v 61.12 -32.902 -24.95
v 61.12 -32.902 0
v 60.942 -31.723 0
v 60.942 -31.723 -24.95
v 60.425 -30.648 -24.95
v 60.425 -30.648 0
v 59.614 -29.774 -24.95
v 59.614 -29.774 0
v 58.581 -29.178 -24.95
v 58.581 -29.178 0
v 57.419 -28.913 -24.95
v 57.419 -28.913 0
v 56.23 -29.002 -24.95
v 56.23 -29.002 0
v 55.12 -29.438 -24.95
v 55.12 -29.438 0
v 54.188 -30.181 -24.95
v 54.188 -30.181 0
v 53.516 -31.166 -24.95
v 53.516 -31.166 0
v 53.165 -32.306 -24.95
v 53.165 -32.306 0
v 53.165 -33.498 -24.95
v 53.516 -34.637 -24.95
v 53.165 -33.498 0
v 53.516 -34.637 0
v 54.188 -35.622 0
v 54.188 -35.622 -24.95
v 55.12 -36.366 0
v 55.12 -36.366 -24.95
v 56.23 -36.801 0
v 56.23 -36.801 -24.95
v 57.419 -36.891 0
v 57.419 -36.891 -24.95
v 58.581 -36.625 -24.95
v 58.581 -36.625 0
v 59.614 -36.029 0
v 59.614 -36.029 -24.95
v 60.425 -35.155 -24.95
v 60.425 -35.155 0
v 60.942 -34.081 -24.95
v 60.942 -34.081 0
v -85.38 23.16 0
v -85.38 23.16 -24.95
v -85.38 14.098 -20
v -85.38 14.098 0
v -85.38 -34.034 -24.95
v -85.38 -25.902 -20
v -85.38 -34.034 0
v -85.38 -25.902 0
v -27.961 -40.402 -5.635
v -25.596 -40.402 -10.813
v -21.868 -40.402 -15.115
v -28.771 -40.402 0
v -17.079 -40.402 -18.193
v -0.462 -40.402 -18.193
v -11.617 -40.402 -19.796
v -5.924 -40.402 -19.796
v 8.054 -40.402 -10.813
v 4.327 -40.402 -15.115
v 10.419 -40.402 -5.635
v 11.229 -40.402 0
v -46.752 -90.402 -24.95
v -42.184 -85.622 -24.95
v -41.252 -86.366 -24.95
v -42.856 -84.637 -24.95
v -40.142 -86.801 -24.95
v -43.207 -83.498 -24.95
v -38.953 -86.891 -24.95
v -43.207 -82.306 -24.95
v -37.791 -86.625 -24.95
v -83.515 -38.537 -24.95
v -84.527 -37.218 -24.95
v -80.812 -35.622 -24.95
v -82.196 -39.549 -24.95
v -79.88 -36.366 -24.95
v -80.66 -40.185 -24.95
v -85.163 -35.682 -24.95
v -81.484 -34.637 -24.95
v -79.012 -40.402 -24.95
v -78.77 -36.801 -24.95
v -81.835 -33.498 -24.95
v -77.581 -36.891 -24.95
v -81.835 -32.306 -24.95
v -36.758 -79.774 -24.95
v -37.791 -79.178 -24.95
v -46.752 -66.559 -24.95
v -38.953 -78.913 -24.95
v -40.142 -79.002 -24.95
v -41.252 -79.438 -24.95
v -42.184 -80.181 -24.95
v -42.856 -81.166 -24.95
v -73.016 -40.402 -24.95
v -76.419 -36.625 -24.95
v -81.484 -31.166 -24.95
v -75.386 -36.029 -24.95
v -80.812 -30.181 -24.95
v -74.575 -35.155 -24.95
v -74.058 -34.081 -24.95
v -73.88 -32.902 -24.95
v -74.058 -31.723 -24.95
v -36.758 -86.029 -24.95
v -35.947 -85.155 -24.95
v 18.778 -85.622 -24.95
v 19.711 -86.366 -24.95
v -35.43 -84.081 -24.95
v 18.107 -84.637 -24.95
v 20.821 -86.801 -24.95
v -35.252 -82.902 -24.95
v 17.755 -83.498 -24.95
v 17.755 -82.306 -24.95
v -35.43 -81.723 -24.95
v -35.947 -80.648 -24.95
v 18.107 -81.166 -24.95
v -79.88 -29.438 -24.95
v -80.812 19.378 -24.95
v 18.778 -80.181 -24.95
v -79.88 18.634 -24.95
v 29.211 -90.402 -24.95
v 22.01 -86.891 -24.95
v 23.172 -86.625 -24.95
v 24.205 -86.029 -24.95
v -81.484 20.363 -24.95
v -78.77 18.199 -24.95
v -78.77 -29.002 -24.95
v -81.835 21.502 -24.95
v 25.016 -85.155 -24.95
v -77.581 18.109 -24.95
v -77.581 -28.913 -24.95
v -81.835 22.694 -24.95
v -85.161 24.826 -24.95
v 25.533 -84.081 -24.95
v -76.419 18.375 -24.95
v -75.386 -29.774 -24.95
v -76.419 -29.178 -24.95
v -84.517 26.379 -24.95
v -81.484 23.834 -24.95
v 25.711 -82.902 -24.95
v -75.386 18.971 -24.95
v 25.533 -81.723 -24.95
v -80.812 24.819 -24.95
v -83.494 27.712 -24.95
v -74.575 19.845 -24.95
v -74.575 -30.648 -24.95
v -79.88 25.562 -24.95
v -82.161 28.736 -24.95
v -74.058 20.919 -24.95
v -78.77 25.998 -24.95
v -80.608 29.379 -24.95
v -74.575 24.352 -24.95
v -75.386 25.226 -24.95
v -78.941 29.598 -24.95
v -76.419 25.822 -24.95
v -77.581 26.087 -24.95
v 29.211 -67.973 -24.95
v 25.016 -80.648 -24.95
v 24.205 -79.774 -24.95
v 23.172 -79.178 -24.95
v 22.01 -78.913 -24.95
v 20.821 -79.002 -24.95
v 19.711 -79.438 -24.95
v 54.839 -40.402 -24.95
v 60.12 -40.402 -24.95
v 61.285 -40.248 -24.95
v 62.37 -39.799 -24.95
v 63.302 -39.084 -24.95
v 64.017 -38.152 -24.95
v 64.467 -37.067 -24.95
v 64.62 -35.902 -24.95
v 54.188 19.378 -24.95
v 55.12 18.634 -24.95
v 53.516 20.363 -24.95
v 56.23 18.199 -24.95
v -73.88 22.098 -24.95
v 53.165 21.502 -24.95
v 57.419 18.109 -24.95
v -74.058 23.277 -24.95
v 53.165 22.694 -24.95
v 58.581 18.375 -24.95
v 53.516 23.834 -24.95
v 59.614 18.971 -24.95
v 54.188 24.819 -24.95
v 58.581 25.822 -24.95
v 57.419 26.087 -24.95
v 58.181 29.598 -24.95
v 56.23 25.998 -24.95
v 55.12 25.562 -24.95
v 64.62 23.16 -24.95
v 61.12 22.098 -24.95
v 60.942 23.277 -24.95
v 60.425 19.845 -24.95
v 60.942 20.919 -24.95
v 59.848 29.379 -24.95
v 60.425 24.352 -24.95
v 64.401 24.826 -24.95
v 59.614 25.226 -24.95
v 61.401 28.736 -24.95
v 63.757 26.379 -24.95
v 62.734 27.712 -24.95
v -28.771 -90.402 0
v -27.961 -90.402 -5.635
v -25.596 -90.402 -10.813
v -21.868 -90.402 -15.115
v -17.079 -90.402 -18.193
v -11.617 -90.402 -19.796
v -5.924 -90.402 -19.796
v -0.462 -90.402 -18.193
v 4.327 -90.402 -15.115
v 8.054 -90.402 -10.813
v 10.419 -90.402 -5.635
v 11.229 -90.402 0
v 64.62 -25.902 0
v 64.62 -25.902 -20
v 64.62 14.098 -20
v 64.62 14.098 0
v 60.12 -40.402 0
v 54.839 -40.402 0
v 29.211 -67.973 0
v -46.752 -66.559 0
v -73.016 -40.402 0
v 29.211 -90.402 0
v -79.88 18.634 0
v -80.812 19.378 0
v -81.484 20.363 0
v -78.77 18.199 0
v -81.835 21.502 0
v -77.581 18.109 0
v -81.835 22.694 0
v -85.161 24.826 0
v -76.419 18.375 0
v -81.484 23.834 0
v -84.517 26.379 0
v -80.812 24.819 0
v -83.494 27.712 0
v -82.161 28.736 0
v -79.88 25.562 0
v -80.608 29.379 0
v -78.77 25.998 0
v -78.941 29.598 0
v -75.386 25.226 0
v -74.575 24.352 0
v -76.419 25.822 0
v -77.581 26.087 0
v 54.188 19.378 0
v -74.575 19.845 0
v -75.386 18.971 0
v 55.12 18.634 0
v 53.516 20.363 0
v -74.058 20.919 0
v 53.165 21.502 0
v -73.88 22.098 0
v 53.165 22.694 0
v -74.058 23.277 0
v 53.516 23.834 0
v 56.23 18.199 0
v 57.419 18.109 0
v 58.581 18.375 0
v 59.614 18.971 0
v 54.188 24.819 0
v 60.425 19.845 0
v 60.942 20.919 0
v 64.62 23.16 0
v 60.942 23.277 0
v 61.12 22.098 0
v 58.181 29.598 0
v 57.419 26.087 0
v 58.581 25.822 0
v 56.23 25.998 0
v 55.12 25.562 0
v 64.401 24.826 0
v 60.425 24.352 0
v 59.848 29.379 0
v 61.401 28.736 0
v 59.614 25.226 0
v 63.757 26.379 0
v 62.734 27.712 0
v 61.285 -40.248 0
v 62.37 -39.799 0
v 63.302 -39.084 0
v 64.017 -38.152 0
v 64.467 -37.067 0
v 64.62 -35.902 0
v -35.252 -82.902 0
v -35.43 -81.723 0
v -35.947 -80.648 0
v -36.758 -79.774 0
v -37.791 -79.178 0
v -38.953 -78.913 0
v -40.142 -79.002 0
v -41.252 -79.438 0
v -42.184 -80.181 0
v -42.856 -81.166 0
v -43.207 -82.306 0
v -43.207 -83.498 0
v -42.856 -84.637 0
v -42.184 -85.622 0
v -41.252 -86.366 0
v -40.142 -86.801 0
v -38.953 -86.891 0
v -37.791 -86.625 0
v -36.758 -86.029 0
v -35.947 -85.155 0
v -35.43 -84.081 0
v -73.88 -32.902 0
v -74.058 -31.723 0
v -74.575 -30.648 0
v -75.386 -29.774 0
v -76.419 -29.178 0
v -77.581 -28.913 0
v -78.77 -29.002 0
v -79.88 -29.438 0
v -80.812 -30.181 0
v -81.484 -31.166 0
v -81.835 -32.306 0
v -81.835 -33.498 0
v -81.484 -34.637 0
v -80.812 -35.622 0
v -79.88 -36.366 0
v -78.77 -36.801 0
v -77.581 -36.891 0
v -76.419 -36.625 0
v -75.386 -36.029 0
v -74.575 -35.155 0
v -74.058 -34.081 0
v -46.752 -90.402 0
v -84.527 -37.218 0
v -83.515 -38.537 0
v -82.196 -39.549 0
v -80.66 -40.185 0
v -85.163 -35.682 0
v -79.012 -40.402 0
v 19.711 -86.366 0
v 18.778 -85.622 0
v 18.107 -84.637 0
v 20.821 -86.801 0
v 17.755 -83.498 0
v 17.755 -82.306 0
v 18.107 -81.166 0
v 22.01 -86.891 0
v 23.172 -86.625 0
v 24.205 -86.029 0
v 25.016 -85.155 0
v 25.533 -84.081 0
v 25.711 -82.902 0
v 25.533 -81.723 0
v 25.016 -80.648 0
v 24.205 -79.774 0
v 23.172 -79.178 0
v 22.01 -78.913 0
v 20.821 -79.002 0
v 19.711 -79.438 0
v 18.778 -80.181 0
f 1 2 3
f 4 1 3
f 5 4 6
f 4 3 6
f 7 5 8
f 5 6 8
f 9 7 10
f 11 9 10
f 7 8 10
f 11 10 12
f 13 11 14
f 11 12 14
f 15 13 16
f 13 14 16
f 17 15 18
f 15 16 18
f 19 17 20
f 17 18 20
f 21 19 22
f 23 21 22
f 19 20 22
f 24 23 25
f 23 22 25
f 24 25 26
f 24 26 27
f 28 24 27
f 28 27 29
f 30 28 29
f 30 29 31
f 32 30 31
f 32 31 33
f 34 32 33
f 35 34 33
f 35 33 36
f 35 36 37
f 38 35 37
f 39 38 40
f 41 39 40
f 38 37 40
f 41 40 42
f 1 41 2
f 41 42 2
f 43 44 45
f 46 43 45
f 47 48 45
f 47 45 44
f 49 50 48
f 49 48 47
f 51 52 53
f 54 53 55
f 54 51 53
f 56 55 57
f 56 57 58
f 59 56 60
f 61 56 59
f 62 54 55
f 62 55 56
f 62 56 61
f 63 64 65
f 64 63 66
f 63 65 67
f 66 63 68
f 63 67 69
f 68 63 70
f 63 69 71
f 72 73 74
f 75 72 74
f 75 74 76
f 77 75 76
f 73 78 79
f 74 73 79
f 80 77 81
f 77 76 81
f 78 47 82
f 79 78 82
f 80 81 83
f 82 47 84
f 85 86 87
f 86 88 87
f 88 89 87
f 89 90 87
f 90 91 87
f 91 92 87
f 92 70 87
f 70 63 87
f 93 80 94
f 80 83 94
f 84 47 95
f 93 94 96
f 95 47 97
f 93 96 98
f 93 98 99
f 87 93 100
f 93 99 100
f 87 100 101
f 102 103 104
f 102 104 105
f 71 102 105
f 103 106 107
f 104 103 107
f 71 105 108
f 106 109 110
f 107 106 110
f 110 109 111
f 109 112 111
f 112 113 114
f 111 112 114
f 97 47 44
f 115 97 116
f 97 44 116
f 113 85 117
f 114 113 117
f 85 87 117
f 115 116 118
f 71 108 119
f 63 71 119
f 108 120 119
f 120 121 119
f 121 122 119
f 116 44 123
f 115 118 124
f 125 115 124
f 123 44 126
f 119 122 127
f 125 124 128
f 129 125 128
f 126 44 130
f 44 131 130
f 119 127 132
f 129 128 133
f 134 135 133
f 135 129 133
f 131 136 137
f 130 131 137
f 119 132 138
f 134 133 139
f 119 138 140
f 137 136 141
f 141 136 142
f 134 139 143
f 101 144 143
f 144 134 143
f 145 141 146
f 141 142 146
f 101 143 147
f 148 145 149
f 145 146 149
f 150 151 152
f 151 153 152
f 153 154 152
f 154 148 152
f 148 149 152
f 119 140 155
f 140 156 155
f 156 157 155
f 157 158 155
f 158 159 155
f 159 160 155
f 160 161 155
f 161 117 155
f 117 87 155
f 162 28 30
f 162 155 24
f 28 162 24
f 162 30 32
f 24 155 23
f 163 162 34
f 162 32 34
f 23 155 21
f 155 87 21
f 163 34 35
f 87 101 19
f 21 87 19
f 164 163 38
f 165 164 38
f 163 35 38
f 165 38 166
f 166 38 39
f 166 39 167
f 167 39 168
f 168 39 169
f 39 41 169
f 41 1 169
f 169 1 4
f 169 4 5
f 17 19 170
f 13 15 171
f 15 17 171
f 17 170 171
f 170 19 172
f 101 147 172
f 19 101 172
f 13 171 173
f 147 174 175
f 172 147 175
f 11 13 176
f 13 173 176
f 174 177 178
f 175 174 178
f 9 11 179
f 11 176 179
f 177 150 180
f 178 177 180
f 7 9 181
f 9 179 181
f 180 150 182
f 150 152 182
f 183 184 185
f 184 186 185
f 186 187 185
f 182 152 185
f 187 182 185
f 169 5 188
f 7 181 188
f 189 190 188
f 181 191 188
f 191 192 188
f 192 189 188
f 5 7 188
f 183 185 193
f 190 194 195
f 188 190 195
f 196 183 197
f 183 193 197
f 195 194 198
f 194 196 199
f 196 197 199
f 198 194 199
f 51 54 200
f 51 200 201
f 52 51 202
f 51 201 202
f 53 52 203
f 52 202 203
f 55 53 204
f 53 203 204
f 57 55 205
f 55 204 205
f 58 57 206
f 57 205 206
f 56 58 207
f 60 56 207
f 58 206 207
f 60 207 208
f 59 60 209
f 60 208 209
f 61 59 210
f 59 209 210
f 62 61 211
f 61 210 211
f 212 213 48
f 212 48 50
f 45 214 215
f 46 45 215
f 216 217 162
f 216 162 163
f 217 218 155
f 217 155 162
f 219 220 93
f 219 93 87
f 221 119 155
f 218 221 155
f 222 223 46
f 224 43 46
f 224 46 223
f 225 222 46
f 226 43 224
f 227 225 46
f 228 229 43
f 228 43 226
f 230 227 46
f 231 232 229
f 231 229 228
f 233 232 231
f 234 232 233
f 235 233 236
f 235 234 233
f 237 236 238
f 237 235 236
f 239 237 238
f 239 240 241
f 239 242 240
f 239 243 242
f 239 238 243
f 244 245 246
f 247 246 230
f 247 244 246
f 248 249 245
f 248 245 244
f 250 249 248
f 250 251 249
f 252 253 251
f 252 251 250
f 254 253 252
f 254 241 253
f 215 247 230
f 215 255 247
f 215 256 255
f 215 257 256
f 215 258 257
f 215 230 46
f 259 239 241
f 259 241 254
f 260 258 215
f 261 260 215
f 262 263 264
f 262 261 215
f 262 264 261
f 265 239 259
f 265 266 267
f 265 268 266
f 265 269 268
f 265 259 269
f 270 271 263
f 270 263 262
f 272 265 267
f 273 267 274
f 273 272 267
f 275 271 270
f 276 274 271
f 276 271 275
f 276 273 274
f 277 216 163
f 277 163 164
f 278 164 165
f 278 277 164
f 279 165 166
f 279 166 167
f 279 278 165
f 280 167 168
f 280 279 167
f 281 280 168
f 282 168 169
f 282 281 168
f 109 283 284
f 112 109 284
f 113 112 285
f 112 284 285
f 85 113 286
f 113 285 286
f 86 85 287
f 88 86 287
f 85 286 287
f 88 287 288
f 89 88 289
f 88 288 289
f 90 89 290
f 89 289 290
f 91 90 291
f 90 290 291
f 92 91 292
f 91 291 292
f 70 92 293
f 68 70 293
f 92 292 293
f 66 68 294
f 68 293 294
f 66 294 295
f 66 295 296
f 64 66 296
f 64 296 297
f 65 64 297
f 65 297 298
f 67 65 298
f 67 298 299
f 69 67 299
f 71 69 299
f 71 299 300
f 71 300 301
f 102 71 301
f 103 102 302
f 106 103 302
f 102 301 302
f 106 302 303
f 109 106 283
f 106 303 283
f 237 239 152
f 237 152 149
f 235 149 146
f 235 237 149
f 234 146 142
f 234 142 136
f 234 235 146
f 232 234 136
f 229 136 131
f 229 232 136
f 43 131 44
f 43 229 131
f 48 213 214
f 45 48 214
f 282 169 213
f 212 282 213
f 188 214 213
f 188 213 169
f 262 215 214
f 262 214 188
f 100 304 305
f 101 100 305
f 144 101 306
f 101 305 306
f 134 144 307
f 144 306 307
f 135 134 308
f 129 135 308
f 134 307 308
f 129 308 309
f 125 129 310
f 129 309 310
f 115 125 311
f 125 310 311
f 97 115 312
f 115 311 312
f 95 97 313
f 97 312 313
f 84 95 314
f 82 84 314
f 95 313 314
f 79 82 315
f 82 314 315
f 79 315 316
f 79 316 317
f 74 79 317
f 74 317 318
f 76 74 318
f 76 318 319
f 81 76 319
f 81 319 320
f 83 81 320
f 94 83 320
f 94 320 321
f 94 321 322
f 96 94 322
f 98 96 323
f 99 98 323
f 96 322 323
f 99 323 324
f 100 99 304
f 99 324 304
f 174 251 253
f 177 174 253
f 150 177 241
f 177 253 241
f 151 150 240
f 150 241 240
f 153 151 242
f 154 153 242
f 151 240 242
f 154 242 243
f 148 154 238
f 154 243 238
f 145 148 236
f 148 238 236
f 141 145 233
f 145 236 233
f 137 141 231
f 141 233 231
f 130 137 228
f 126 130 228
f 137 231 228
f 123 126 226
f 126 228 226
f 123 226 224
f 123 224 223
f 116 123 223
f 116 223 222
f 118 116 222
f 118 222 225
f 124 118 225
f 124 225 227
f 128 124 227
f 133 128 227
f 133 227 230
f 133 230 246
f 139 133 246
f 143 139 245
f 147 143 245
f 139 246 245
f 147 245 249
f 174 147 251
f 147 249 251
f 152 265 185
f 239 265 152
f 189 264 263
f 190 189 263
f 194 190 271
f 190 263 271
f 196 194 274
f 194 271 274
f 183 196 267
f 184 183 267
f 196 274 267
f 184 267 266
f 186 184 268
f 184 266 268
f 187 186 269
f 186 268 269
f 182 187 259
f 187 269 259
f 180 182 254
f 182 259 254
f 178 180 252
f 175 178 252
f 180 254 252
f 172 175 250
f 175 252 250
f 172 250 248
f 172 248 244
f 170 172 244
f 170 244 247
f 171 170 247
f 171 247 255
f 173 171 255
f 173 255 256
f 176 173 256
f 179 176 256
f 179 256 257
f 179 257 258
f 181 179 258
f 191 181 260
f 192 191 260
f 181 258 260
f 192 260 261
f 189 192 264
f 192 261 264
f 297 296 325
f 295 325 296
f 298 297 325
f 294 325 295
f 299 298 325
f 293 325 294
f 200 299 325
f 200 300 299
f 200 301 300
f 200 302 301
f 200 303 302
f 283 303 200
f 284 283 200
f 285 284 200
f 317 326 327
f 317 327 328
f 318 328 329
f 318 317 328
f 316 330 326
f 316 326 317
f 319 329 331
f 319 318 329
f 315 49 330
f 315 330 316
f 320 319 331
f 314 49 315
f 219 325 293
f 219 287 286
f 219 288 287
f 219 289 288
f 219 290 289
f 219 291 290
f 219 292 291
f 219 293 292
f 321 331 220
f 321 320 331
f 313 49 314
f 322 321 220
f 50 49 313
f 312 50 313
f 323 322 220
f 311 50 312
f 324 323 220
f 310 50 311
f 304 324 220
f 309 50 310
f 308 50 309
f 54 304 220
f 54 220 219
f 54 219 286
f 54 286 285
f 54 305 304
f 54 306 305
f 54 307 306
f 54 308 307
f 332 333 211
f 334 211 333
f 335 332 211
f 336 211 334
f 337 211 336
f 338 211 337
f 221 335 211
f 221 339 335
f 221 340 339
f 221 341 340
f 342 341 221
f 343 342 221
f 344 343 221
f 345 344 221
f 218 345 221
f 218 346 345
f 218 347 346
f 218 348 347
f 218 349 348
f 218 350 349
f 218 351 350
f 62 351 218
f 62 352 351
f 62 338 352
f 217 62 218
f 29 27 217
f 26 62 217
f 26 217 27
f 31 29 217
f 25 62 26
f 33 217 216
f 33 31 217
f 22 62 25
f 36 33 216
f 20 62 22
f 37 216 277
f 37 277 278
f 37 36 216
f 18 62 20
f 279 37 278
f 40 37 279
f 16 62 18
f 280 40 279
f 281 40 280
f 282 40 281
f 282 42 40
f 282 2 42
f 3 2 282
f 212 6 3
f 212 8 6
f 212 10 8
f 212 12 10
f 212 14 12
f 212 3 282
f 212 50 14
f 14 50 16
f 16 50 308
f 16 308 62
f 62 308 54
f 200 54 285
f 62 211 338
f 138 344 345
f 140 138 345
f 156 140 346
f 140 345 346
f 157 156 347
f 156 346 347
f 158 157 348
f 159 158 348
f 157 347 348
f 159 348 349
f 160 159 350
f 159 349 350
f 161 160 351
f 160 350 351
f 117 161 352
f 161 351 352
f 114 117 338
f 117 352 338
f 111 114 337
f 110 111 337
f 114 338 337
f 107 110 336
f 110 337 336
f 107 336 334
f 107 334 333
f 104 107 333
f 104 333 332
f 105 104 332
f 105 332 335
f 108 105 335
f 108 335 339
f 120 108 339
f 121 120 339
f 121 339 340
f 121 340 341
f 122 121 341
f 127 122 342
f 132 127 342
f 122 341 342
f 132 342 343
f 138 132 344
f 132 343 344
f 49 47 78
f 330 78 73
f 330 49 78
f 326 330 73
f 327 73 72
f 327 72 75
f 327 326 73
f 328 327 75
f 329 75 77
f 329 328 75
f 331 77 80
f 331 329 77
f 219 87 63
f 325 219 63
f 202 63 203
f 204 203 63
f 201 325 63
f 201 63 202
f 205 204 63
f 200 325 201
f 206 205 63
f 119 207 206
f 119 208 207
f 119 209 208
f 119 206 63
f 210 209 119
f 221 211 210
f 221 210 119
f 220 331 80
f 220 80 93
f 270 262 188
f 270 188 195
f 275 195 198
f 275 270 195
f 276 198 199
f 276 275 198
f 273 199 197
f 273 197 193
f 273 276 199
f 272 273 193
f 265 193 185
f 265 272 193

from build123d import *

# Parameters (mm, degrees)
F0_R          = 4
F1_DEPTH      = 24.95
F2_W          = 40
F2_H          = 20
F3_DEPTH      = 150
F3_DEPTH_BACK = 150
F4_R          = 20
F5_DEPTH      = 50


with BuildPart() as f1:
    # F0 (on Top) → F1 (new body)
    with BuildSketch(Plane.XY):
        with BuildLine():
            Line((58.181364, 29.598313), (-78.941487, 29.598313))
            ThreePointArc((-78.941487, 29.598313), (-83.494247, 27.712498), (-85.380062, 23.159739))
            Line((-85.380062, 23.159739), (-85.380062, -34.03374))
            ThreePointArc((-85.380062, -34.03374), (-83.514933, -38.536559), (-79.012115, -40.401687))
            Line((-79.012115, -40.401687), (-73.01646, -40.401687))
            Line((-73.01646, -40.401687), (-58.498297, -40.401687))
            Line((-58.498297, -40.401687), (-46.752002, -40.401687))
            Line((-46.752002, -40.401687), (-43.284619, -40.401687))
            Line((-43.284619, -40.401687), (26.715381, -40.401687))
            Line((26.715381, -40.401687), (29.210588, -40.401687))
            Line((29.210588, -40.401687), (54.838952, -40.401687))
            Line((54.838952, -40.401687), (60.120346, -40.401687))
            ThreePointArc((60.120346, -40.401687), (63.302038, -39.083787), (64.619938, -35.902095))
            Line((64.619938, -35.902095), (64.619938, 23.159739))
            ThreePointArc((64.619938, 23.159739), (62.734124, 27.712498), (58.181364, 29.598313))
        make_face()
        with Locations((-77.880062, -32.901687)):
            Circle(F0_R, mode=Mode.SUBTRACT)
        with Locations((57.119938, -32.901687)):
            Circle(F0_R, mode=Mode.SUBTRACT)
        with Locations((-77.880062, 22.098313)):
            Circle(F0_R, mode=Mode.SUBTRACT)
        with Locations((57.119938, 22.098313)):
            Circle(F0_R, mode=Mode.SUBTRACT)
        Polygon((-58.498297, -40.401687), (-73.01646, -40.401687), (-46.752002, -66.558582), (-46.752002, -40.401687), align=None)
        Polygon((29.210588, -67.972728), (54.838952, -40.401687), (29.210588, -40.401687), align=None)
        Polygon((-46.752002, -40.401687), (-46.752002, -66.558582), (-46.752002, -82.901687), (-46.752002, -90.401687), (-39.252002, -90.401687), (21.710588, -90.401687), (29.210588, -90.401687), (29.210588, -82.901687), (29.210588, -67.972728), (29.210588, -40.401687), (26.715381, -40.401687), (-43.284619, -40.401687), align=None)
        with Locations((-39.252002, -82.901687)):
            Circle(F0_R, mode=Mode.SUBTRACT)
        with Locations((21.710588, -82.901687)):
            Circle(F0_R, mode=Mode.SUBTRACT)
    extrude(amount=-F1_DEPTH)

    # F2 (on face) → F3 (cut, two sides)
    with BuildSketch(Plane.YZ.offset(64.619938)) as f3_sk:
        with Locations((-5.902329, -10)):
            Rectangle(F2_W, F2_H)
    extrude(amount=-F3_DEPTH, mode=Mode.SUBTRACT)
    extrude(f3_sk.sketch, amount=-F3_DEPTH_BACK, mode=Mode.SUBTRACT)

    # F4 (on face) → F5 (cut)
    with BuildSketch(Plane.XZ.offset(90.401687)):
        with Locations((-8.770707, 0)):
            Circle(F4_R)
    extrude(amount=-F5_DEPTH, mode=Mode.SUBTRACT)


solid = f1.part
